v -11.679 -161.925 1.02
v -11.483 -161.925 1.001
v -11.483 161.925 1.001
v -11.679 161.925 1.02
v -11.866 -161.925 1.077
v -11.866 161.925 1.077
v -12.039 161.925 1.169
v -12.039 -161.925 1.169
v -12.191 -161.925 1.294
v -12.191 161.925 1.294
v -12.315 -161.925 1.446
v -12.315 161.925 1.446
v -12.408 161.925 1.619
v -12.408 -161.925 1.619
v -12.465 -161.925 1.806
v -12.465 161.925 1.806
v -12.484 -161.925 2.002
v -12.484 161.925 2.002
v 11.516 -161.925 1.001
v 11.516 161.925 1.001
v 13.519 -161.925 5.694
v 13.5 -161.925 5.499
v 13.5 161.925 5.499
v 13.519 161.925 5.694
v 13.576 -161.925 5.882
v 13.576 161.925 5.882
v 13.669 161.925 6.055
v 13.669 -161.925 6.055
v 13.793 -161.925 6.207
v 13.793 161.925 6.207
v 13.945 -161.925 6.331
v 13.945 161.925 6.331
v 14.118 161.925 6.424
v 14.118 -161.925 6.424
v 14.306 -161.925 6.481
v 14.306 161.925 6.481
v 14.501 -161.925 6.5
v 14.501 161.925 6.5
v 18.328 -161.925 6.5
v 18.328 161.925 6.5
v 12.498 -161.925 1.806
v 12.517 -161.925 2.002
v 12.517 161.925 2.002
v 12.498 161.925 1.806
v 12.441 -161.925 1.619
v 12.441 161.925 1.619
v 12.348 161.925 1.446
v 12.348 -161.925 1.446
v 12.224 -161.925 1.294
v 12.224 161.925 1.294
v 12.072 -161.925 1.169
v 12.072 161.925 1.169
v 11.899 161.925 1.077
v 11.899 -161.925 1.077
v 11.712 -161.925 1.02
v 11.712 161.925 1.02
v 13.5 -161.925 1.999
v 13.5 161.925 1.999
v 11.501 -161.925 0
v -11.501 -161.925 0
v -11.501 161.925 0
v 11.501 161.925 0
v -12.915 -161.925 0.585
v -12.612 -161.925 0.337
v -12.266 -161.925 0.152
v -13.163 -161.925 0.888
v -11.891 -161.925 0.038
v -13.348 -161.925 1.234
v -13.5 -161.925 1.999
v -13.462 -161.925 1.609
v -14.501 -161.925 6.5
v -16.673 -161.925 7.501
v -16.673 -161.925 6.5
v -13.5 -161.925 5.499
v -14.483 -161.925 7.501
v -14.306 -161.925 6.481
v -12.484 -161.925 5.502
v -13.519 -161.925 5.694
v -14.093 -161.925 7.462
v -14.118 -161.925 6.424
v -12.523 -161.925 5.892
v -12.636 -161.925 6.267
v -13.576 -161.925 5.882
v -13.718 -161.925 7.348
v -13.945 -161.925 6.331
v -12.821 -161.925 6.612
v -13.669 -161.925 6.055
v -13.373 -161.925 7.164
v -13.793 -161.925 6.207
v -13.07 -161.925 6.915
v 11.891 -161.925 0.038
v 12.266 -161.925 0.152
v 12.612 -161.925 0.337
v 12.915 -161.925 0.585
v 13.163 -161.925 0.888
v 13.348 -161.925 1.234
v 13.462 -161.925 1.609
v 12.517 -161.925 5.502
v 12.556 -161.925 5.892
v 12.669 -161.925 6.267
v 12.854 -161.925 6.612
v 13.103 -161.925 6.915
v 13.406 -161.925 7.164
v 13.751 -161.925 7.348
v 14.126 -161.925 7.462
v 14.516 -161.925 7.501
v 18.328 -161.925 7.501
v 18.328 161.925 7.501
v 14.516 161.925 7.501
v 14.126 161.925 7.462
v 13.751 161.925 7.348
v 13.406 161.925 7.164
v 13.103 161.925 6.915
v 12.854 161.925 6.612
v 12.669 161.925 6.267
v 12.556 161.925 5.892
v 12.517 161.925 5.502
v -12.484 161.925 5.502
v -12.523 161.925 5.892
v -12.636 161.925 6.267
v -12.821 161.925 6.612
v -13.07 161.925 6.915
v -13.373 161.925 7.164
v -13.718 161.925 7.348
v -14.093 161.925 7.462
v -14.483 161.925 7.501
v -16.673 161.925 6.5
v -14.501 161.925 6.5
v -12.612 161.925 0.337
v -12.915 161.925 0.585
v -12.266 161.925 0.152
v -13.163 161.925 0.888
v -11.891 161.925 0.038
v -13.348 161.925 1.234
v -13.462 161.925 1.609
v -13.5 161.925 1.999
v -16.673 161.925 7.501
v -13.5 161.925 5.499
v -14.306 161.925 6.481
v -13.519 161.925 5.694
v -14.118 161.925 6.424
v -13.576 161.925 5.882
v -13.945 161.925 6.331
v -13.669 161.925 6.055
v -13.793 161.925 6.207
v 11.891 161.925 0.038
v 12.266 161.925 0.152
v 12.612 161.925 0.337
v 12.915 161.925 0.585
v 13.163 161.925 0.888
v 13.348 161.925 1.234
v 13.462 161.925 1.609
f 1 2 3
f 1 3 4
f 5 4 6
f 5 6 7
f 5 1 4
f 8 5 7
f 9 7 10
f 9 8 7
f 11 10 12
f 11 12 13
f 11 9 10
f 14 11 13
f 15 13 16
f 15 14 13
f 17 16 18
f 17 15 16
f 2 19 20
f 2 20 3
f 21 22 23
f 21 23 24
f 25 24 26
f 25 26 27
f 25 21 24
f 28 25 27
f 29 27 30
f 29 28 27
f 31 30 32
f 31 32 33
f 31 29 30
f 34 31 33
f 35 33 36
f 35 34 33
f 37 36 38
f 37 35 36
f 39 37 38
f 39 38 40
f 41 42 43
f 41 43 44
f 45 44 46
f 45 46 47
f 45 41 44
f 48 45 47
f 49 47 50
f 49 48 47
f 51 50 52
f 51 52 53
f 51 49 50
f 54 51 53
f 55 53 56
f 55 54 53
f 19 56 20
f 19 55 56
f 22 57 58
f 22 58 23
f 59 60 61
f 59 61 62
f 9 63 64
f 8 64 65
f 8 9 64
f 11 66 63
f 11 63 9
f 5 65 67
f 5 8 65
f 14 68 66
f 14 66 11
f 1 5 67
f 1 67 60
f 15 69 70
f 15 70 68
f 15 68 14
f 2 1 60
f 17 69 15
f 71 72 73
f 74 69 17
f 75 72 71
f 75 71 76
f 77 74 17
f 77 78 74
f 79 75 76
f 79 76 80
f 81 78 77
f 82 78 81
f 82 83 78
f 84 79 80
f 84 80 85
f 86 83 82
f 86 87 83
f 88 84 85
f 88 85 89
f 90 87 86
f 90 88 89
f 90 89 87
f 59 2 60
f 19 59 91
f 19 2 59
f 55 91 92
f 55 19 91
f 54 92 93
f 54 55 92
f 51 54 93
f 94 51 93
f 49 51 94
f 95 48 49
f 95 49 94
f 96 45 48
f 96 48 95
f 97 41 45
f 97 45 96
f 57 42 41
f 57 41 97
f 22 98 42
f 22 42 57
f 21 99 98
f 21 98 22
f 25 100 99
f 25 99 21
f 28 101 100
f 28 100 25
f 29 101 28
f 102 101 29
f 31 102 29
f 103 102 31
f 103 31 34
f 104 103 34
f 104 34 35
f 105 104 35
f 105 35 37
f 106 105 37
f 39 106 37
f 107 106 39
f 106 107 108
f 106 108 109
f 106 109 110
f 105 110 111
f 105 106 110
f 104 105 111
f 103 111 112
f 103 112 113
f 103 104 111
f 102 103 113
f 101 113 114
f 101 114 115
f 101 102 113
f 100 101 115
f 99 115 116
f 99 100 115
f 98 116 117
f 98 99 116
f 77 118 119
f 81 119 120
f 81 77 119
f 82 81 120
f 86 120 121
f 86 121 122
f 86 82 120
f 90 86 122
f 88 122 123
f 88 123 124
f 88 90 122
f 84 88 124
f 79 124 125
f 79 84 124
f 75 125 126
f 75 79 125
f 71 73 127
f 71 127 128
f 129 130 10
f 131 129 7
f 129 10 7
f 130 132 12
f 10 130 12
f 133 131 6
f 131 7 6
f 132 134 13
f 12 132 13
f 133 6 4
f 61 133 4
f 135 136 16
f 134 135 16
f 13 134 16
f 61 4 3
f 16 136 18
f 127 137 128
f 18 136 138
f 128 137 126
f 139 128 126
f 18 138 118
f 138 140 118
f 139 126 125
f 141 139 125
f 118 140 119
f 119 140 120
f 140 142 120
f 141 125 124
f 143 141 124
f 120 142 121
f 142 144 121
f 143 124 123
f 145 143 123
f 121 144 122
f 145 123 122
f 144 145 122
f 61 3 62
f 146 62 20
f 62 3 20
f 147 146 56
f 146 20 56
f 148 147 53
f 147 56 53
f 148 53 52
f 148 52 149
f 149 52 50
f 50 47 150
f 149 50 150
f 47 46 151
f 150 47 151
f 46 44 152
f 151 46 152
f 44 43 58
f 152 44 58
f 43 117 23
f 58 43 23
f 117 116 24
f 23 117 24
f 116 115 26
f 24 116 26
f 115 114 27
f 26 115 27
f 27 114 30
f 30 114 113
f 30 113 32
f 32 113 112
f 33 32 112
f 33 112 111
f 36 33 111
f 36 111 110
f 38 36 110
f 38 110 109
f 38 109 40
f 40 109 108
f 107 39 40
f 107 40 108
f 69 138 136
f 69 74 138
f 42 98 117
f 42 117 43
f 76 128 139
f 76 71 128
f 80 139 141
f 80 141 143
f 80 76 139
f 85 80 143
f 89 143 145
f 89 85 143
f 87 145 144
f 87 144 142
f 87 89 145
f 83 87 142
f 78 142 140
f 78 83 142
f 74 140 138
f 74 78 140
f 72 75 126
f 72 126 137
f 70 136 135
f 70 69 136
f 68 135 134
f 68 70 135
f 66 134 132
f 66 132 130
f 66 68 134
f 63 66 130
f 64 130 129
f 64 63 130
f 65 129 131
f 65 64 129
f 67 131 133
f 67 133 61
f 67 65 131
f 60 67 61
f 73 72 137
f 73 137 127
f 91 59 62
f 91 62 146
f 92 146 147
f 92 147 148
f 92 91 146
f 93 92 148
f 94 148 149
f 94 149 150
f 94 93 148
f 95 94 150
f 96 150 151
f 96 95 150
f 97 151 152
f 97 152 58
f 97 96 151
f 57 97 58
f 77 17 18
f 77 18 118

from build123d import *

# Parameters (mm, degrees)
F1_DEPTH = 161.925


with BuildPart() as f1:
    # F0 (on Front) → F1 (new body, symmetric)
    with BuildSketch(Plane.XZ):
        with BuildLine():
            ThreePointArc((-13.5001, 1.99898), (-12.914612, 0.585488), (-11.50112, 0))
            Line((-11.50112, 0), (11.50112, 0))
            ThreePointArc((11.50112, 0), (12.914612, 0.585488), (13.5001, 1.99898))
            Line((13.5001, 1.99898), (13.5001, 5.4991))
            ThreePointArc((13.5001, 5.4991), (13.793216, 6.206744), (14.50086, 6.49986))
            Line((14.50086, 6.49986), (18.328109, 6.49986))
            Line((18.328109, 6.49986), (18.328109, 7.50062))
            Line((18.328109, 7.50062), (14.5161, 7.50062))
            ThreePointArc((14.5161, 7.50062), (13.102608, 6.915132), (12.51712, 5.50164))
            Line((12.51712, 5.50164), (12.51712, 2.00152))
            ThreePointArc((12.51712, 2.00152), (12.224004, 1.293876), (11.51636, 1.00076))
            Line((11.51636, 1.00076), (-11.48334, 1.00076))
            ThreePointArc((-11.48334, 1.00076), (-12.190984, 1.293876), (-12.4841, 2.00152))
            Line((-12.4841, 2.00152), (-12.4841, 5.50164))
            ThreePointArc((-12.4841, 5.50164), (-13.069588, 6.915132), (-14.48308, 7.50062))
            Line((-14.48308, 7.50062), (-16.673091, 7.50062))
            Line((-16.673091, 7.50062), (-16.673091, 6.49986))
            Line((-16.673091, 6.49986), (-14.50086, 6.49986))
            ThreePointArc((-14.50086, 6.49986), (-13.793216, 6.206744), (-13.5001, 5.4991))
            Line((-13.5001, 5.4991), (-13.5001, 1.99898))
        make_face()
    extrude(amount=F1_DEPTH, both=True)


solid = f1.part
